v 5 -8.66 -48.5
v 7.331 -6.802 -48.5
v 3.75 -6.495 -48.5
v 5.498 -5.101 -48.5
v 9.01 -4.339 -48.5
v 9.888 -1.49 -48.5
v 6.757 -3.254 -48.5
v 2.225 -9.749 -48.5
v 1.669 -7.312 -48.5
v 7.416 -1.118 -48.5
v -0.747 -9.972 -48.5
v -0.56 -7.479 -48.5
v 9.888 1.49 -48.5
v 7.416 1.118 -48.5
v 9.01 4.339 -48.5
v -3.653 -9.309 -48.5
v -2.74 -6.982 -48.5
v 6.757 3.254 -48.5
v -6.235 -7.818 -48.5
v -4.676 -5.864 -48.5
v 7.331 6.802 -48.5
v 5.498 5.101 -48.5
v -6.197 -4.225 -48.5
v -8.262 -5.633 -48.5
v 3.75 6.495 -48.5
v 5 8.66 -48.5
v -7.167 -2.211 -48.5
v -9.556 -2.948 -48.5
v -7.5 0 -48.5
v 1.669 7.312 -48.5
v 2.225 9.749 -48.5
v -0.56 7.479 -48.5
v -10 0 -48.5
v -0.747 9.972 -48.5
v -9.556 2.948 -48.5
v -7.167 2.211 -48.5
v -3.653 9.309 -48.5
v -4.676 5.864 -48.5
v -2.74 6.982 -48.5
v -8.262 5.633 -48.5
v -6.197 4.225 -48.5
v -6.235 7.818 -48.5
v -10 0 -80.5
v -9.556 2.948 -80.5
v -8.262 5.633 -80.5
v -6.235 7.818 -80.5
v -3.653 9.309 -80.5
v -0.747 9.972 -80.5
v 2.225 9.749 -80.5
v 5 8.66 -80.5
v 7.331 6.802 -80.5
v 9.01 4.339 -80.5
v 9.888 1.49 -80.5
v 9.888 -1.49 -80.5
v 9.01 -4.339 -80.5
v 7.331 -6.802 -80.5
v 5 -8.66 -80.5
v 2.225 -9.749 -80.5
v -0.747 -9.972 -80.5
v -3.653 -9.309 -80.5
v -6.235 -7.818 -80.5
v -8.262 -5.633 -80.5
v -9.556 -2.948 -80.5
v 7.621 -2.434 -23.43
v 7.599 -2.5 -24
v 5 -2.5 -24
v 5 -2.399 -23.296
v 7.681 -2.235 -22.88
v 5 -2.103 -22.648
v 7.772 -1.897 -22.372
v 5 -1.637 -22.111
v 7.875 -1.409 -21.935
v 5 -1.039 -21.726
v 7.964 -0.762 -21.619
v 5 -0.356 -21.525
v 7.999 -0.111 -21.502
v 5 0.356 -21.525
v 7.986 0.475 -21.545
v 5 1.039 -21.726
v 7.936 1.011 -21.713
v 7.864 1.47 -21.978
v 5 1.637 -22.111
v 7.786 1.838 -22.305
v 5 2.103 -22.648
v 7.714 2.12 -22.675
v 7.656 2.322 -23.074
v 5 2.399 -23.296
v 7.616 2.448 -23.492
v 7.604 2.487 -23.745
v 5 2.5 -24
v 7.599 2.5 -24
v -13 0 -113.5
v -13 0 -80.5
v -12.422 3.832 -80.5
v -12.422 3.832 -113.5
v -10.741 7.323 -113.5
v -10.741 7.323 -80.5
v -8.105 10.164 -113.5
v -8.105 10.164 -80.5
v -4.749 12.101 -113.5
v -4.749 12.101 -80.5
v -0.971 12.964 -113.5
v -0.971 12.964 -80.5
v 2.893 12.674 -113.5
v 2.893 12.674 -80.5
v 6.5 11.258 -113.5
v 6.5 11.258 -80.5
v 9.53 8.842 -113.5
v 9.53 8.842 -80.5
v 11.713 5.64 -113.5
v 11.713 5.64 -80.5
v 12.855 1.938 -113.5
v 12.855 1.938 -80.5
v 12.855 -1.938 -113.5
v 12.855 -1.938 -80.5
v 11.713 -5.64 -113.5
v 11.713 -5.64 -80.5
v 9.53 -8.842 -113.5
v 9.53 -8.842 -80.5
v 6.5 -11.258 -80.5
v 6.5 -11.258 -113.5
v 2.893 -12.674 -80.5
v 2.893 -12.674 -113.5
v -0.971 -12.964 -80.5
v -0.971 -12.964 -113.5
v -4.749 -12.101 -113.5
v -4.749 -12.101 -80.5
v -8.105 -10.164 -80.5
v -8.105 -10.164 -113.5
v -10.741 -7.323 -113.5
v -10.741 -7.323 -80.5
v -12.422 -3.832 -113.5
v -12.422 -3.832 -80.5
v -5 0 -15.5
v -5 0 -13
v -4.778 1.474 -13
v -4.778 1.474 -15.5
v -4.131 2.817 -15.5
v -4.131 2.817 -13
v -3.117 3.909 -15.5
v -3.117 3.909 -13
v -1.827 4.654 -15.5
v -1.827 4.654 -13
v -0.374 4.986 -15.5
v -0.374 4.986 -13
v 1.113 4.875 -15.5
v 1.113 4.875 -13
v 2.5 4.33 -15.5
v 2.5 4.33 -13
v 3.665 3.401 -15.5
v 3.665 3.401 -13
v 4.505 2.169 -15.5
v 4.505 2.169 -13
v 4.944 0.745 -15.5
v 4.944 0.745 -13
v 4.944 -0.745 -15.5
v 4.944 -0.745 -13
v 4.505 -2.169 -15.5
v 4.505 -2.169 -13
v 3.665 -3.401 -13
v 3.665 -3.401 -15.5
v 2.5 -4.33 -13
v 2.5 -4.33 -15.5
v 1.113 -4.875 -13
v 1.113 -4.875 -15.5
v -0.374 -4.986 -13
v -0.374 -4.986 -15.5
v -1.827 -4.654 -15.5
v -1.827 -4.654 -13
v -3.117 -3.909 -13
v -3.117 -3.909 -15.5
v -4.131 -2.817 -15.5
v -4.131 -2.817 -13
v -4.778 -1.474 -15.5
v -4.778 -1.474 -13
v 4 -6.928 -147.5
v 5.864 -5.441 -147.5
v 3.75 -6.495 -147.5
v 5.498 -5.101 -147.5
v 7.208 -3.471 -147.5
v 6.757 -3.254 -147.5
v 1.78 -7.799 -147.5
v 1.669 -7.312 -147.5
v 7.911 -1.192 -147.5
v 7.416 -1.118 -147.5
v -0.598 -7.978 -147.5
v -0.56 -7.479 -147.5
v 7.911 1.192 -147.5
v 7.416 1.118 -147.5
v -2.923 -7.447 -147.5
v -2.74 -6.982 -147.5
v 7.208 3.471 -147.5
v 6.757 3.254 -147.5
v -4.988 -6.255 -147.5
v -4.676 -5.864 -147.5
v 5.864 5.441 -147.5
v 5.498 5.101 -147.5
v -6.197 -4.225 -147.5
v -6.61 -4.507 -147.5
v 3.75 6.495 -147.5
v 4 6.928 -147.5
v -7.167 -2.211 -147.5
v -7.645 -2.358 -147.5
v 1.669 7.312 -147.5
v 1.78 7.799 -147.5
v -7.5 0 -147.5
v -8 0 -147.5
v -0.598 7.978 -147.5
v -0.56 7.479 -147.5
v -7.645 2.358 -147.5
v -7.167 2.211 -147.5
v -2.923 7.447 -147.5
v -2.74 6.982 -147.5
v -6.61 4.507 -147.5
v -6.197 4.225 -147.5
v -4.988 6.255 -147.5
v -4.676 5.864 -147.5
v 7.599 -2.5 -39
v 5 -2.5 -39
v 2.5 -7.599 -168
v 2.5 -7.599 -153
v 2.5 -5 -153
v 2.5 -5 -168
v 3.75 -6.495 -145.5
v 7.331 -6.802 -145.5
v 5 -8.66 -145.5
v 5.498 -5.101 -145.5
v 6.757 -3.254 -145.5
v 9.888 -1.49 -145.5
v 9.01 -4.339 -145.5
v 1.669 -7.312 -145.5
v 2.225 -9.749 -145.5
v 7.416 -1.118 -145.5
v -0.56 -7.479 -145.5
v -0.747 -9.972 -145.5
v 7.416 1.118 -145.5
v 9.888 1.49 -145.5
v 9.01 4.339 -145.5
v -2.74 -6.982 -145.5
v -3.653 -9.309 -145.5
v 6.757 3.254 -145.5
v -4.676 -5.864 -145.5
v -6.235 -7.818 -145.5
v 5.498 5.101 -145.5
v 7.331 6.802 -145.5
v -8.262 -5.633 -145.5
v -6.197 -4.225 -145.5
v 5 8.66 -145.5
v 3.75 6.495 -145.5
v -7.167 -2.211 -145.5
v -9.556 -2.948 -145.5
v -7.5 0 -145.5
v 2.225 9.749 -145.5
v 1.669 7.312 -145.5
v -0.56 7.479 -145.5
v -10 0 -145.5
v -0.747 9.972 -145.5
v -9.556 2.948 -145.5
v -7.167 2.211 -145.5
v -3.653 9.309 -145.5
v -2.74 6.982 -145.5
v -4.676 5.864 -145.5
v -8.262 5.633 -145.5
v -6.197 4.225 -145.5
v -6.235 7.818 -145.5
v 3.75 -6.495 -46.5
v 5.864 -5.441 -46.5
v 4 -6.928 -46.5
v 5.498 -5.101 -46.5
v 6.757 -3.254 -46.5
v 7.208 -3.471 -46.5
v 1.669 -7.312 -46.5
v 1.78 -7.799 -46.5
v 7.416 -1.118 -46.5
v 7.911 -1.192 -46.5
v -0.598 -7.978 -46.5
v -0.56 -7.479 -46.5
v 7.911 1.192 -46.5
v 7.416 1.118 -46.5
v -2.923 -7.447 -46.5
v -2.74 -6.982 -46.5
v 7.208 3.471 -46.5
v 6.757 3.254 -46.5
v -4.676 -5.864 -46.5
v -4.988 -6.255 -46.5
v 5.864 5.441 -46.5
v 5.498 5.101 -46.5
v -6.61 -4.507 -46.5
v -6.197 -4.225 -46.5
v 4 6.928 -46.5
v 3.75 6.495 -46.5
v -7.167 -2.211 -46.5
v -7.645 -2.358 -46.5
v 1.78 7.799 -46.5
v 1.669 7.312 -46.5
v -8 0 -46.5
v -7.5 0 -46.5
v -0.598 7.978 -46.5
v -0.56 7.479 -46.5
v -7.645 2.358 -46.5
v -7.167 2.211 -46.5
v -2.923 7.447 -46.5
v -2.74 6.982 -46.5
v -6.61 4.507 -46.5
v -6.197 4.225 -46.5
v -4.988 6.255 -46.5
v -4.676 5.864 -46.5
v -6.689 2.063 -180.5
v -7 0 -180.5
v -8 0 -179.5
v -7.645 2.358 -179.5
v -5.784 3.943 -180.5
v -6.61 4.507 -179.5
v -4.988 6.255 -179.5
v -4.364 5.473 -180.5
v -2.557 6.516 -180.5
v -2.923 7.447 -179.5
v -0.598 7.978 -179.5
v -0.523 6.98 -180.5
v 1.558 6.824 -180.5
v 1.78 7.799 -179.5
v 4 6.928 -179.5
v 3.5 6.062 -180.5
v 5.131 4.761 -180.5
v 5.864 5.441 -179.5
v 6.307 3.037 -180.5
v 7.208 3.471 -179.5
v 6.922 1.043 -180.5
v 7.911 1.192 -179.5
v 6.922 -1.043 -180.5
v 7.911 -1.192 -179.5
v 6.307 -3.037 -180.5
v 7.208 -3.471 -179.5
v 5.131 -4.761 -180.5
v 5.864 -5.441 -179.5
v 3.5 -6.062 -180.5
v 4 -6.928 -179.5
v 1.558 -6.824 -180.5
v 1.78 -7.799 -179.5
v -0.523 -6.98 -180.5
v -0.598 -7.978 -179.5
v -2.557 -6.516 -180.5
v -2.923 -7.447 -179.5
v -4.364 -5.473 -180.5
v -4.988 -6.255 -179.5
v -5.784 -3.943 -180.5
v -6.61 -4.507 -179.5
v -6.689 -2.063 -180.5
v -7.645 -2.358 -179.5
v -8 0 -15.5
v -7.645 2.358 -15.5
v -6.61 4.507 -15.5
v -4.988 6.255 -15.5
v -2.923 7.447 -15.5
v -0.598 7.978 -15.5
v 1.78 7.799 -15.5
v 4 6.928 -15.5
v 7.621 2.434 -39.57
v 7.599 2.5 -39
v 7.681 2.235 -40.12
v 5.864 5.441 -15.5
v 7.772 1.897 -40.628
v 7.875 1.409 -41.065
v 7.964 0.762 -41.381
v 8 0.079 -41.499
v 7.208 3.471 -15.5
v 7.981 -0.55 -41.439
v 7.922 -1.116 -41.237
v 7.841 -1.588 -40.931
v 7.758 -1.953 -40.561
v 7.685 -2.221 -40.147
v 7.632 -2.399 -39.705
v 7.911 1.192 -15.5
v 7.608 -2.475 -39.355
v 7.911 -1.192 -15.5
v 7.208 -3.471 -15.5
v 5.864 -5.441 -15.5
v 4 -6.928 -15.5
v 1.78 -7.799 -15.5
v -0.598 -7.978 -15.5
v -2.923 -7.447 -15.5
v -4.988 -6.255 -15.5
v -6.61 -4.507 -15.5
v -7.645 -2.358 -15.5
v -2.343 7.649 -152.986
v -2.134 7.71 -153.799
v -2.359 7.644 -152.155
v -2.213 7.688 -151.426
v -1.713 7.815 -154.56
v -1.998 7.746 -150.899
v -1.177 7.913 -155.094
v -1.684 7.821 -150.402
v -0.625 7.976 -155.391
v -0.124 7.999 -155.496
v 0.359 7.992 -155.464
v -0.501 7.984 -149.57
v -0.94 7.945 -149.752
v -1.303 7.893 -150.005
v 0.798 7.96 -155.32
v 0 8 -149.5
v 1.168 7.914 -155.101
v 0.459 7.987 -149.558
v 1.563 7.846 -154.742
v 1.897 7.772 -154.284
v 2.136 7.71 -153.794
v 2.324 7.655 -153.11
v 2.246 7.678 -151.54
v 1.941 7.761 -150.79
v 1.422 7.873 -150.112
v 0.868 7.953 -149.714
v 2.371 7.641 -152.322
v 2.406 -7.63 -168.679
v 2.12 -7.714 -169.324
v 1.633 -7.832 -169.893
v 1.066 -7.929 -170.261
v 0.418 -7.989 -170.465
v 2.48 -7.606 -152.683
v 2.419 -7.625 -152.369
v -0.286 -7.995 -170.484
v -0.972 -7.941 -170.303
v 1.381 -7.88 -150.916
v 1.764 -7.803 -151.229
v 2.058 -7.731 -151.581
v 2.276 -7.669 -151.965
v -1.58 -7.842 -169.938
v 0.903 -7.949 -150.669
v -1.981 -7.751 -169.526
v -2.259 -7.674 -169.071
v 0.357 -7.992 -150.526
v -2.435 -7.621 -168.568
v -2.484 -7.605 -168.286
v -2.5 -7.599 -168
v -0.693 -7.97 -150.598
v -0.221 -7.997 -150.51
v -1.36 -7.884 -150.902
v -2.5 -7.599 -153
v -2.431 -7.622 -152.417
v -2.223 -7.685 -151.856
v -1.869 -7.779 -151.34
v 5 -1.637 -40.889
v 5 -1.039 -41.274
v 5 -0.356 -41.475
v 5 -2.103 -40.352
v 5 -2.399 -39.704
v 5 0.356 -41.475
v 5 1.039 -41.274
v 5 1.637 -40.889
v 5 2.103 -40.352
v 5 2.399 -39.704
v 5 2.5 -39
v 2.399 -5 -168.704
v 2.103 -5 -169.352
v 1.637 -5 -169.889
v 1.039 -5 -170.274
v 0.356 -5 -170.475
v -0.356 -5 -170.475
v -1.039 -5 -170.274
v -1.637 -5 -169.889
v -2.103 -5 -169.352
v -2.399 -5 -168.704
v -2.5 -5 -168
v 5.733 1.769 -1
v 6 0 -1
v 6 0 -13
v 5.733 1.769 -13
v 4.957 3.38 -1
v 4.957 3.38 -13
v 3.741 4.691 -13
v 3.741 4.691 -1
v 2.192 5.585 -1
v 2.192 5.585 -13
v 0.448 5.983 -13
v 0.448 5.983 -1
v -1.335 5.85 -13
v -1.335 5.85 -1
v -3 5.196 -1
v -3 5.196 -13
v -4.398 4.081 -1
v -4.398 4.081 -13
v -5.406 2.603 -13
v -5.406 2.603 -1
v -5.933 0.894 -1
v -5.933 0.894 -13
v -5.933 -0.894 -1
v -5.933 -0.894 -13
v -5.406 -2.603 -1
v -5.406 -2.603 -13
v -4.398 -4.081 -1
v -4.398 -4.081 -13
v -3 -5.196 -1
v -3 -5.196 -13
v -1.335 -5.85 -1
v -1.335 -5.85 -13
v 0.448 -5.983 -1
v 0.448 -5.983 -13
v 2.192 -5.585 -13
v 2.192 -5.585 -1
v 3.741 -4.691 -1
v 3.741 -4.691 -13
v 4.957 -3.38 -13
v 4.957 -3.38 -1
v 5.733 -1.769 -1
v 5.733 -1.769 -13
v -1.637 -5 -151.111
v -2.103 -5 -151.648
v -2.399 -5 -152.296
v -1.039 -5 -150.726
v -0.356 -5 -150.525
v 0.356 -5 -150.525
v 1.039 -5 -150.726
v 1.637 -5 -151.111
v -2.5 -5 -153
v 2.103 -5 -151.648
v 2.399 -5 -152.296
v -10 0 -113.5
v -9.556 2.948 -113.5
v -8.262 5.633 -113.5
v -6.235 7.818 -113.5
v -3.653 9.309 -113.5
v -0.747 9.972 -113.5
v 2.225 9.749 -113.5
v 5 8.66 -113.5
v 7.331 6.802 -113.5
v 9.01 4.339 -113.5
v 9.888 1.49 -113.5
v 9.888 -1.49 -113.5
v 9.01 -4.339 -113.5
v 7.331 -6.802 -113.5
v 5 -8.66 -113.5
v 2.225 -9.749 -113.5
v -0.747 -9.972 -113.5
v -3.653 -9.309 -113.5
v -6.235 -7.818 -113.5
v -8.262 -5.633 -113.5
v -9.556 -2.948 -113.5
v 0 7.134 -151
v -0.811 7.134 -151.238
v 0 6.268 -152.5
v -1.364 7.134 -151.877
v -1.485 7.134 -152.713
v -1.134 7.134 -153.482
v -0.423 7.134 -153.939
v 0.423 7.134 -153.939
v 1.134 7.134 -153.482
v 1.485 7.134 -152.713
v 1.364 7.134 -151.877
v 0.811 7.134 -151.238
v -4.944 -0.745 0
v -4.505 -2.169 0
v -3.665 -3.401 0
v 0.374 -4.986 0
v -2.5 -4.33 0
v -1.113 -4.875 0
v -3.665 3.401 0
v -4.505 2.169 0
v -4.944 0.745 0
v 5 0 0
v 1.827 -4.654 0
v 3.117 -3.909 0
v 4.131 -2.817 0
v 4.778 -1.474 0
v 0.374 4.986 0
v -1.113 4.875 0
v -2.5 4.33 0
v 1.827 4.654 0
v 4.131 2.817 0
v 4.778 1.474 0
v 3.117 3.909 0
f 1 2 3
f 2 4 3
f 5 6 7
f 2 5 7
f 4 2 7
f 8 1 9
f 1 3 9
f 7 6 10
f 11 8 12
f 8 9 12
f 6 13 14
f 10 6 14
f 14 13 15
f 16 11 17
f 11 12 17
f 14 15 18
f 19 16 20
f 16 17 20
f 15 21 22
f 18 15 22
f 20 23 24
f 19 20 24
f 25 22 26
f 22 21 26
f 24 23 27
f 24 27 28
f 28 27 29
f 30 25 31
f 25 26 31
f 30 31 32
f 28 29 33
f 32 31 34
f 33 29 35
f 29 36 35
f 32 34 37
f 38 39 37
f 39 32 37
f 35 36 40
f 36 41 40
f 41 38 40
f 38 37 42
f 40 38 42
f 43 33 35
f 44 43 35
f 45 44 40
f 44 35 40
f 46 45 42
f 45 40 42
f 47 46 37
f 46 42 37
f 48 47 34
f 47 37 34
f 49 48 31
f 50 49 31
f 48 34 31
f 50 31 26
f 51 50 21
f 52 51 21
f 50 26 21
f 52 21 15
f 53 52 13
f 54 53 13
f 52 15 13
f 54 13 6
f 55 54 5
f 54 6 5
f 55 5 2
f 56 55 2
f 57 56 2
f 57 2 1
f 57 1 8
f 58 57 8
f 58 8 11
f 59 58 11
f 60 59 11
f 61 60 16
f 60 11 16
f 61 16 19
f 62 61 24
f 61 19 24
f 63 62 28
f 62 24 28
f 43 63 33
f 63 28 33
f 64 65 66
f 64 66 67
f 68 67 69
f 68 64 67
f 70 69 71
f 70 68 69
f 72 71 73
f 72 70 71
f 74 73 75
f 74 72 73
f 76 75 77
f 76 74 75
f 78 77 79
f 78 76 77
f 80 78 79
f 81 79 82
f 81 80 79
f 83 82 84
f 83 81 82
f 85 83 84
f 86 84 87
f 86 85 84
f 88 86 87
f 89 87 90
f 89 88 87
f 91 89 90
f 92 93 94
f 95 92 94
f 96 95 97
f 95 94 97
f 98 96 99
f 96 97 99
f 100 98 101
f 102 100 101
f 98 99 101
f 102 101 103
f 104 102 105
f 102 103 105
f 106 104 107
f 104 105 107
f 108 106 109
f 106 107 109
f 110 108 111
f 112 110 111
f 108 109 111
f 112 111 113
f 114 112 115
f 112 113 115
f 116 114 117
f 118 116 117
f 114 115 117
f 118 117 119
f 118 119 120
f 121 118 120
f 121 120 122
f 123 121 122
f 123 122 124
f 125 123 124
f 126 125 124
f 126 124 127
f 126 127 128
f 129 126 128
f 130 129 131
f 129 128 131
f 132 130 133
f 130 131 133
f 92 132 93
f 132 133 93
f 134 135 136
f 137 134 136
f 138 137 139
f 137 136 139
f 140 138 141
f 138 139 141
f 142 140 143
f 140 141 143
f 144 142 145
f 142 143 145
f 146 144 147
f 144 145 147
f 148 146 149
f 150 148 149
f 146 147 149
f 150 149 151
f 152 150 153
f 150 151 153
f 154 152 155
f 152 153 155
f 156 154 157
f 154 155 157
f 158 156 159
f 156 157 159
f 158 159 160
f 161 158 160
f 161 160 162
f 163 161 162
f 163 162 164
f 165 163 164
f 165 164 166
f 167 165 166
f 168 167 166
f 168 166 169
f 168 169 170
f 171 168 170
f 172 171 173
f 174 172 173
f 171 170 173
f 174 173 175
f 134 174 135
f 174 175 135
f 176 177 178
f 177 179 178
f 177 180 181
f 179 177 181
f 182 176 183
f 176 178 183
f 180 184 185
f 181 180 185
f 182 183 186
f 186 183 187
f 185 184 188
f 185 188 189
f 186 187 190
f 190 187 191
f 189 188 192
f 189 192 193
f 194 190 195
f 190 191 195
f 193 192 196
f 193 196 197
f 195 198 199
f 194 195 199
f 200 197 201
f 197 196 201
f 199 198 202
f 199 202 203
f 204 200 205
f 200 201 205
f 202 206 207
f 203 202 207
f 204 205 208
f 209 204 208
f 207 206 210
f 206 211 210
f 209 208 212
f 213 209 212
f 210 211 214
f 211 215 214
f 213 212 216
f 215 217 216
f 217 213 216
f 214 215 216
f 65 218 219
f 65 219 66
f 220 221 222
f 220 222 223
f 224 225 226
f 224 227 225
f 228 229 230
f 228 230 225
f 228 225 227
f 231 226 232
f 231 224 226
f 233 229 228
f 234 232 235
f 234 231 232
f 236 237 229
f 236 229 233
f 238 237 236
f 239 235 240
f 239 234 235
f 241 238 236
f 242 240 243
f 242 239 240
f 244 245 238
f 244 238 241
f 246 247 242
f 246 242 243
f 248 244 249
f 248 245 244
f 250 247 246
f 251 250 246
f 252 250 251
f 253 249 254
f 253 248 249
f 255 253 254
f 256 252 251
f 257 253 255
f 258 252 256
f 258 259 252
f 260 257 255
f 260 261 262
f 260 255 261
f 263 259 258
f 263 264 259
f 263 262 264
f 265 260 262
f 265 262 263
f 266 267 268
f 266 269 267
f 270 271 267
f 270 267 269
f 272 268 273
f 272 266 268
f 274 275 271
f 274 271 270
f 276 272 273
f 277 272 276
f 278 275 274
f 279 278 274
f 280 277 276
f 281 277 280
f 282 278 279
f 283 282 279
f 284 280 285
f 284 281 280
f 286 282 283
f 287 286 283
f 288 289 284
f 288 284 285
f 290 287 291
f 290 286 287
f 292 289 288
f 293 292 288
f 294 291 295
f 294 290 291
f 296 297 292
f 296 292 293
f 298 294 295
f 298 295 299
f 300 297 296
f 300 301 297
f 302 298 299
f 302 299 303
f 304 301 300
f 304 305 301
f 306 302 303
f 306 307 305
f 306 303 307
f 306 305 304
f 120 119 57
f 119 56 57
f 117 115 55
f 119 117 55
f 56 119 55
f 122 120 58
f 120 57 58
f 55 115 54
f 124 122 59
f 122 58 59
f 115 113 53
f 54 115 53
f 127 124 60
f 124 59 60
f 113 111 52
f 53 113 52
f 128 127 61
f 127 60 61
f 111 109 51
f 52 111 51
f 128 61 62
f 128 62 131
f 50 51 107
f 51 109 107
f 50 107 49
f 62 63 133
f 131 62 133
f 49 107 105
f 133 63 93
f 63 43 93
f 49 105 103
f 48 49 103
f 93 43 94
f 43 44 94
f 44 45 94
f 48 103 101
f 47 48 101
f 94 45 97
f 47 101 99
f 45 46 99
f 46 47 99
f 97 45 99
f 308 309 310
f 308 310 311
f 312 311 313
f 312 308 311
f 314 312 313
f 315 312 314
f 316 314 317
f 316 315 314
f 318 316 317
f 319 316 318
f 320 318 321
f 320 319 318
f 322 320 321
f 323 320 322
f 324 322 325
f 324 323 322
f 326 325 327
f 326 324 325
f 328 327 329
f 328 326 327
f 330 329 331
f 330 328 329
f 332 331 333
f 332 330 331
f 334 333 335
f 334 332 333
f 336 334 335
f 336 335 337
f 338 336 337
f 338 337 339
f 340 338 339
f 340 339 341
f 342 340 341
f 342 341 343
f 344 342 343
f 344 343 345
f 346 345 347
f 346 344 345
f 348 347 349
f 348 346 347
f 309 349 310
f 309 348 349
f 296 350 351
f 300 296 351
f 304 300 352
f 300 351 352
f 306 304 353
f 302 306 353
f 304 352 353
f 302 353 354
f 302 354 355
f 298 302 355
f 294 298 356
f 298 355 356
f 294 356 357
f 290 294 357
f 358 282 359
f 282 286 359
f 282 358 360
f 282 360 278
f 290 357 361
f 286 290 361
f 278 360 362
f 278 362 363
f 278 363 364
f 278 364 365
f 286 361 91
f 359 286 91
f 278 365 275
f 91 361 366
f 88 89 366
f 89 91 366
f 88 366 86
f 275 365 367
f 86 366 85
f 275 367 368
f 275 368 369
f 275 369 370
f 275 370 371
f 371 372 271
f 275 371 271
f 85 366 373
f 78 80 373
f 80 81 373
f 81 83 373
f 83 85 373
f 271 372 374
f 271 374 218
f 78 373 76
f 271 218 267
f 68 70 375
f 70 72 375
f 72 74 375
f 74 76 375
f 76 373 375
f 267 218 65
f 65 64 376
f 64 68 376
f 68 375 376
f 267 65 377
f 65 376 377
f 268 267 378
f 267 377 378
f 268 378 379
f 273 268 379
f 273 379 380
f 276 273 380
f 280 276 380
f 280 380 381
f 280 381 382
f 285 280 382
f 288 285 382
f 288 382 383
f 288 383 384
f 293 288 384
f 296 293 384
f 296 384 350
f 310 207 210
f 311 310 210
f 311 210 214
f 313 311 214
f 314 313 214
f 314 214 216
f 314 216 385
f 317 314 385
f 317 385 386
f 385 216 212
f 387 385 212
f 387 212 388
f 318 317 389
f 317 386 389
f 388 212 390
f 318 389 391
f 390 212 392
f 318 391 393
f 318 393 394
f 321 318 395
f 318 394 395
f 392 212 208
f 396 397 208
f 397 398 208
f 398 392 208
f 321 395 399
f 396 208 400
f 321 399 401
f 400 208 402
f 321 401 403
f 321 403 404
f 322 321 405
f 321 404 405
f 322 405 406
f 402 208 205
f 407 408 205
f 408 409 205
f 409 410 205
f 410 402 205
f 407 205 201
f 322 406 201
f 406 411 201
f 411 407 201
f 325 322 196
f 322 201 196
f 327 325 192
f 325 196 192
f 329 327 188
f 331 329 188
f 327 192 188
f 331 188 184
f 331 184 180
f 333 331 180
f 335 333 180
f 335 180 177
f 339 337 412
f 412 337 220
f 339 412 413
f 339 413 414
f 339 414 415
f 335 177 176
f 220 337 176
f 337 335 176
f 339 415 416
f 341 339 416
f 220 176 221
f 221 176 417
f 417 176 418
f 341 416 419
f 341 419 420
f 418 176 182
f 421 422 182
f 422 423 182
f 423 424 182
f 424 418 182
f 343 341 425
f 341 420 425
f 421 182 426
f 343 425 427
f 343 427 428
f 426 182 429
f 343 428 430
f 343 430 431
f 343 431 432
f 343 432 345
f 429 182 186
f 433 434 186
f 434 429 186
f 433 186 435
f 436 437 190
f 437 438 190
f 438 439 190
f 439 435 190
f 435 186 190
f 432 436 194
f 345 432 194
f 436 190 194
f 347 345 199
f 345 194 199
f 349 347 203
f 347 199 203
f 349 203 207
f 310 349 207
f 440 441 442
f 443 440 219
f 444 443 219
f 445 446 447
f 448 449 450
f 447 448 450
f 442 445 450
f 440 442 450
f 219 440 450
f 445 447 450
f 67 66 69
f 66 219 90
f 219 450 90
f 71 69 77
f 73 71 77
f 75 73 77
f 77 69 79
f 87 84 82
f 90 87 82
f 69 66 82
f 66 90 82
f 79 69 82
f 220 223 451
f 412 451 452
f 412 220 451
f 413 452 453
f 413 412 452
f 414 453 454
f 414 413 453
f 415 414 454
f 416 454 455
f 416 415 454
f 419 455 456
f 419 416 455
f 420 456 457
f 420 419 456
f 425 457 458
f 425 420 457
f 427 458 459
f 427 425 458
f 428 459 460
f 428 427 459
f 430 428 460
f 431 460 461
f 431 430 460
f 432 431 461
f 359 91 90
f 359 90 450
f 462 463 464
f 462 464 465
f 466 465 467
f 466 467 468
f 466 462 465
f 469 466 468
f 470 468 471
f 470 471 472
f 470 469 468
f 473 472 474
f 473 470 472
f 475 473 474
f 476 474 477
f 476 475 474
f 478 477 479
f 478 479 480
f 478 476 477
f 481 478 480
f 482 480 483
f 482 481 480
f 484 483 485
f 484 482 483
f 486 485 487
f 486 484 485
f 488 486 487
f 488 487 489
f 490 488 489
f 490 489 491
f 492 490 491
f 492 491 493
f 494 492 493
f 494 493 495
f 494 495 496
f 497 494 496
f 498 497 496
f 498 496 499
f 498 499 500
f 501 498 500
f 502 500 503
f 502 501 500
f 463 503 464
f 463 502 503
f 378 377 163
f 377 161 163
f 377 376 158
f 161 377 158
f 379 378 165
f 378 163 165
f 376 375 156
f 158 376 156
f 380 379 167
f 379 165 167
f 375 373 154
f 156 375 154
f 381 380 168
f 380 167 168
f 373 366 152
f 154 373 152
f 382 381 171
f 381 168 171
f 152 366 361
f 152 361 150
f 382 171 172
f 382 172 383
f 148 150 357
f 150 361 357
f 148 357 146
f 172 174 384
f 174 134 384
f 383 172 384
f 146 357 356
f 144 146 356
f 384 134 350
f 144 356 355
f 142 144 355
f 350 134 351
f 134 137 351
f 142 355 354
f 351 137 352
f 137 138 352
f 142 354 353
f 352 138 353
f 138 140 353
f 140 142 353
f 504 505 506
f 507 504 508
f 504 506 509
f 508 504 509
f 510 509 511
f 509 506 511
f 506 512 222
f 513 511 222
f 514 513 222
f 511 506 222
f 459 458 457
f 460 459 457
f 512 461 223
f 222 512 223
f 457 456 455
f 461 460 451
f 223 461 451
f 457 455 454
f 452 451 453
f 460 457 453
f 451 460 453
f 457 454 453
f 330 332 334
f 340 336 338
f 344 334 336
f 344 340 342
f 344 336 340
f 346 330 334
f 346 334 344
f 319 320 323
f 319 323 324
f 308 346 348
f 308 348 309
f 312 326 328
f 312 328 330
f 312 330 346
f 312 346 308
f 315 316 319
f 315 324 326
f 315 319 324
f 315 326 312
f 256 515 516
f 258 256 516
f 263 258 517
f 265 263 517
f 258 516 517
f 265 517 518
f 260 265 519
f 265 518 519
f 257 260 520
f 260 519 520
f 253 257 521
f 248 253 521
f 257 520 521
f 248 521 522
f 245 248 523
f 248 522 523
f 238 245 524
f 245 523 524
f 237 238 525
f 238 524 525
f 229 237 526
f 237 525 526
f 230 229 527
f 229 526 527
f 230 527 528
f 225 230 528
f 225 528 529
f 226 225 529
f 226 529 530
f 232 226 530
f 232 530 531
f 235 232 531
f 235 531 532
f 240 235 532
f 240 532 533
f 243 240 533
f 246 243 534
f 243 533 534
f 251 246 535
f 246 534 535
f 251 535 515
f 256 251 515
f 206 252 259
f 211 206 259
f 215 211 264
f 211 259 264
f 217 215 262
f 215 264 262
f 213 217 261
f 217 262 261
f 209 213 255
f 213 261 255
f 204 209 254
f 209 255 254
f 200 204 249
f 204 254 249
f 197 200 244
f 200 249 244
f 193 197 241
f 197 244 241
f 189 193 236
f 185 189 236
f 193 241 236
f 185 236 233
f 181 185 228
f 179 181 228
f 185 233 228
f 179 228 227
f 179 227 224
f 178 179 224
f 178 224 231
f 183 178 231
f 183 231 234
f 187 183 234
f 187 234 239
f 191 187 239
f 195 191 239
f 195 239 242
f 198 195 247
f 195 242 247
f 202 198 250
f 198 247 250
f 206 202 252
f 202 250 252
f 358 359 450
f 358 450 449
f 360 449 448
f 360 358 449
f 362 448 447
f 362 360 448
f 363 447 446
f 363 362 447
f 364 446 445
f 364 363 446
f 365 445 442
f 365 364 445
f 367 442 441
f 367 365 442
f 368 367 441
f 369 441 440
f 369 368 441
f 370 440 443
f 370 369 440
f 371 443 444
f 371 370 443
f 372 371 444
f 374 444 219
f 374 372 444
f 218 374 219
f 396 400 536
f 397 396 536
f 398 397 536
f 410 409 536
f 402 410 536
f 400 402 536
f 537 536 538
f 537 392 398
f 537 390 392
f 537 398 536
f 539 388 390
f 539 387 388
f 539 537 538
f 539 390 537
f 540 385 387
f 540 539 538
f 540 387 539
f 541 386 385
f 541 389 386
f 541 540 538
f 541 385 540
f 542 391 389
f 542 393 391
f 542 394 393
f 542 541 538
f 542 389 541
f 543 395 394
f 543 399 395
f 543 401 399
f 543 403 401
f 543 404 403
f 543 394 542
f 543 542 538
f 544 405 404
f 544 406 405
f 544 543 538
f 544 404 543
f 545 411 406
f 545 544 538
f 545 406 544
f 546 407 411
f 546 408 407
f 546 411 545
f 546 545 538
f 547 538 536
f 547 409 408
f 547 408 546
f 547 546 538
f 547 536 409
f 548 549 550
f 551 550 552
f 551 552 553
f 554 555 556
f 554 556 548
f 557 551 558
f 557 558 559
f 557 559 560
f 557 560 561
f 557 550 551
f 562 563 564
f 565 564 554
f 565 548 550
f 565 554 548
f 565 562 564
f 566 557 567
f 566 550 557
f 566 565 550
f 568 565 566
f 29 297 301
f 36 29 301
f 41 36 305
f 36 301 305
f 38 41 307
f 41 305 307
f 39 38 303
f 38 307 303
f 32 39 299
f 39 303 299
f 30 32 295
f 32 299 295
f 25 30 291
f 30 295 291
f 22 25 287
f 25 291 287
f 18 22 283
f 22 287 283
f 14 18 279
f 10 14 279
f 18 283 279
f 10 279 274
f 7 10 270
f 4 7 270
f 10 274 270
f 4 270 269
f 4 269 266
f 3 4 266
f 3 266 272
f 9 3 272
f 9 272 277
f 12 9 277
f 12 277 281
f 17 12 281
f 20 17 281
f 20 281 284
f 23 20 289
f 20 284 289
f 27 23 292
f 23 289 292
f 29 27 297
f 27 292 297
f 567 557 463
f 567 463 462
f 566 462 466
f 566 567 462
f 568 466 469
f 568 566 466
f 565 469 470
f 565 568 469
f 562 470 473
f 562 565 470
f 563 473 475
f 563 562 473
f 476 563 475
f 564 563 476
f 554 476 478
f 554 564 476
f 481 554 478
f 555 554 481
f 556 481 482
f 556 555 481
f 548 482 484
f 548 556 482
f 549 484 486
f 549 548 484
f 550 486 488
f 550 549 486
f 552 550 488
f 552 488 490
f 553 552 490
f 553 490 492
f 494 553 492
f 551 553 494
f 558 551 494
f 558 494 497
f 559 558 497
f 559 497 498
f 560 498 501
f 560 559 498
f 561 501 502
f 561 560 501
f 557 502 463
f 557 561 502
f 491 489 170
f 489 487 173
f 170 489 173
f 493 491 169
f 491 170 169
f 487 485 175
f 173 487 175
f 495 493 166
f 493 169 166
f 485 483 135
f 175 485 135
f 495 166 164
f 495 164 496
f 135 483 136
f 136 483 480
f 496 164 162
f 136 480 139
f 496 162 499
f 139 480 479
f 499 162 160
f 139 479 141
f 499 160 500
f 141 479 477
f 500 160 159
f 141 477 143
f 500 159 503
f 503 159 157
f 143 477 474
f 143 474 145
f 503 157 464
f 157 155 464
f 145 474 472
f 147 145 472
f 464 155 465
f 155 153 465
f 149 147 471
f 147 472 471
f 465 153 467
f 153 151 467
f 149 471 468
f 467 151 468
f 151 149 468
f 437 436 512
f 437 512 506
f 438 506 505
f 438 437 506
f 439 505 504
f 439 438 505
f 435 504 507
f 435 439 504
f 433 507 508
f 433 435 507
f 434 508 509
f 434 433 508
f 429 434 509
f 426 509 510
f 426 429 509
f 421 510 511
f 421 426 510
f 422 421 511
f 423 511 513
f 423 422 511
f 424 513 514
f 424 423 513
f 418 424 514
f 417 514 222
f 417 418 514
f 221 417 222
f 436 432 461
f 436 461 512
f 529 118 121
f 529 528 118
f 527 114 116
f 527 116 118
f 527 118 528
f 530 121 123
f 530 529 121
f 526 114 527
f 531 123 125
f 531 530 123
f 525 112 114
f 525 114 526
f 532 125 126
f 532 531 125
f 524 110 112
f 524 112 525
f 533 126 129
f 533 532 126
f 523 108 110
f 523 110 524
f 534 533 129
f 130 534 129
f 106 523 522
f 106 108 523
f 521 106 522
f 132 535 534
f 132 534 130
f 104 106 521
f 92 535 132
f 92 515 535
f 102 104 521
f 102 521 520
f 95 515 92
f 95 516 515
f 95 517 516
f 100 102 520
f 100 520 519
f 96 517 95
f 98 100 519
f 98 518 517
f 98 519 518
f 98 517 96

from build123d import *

# Parameters (mm, degrees)
SKETCH_1_R          = 6
EXTRUDE_1_DEPTH     = 13
SKETCH_2_R          = 5
EXTRUDE_2_DEPTH     = 2.5
SKETCH_3_R          = 8
EXTRUDE_3_DEPTH     = 31
SKETCH_4_R          = 7.5
EXTRUDE_4_DEPTH     = 2
SKETCH_5_R          = 10
EXTRUDE_5_DEPTH     = 32
SKETCH_6_R          = 13
EXTRUDE_6_DEPTH     = 33
SKETCH_7_R          = 10
EXTRUDE_7_DEPTH     = 32
SKETCH_8_R          = 7.5
EXTRUDE_8_DEPTH     = 2
SKETCH_9_R          = 8
EXTRUDE_9_DEPTH     = 33
CUT_EXTRUDE_1_DEPTH = 3
CUT_EXTRUDE_2_DEPTH = 3
CHAMFER_1_SIZE      = 1


with BuildPart() as part:
    # 草图1 → 凸台-拉伸1 (new body)
    with BuildSketch(Plane.XY):
        Circle(SKETCH_1_R)
    extrude(amount=-EXTRUDE_1_DEPTH)

    # 草图2 → 凸台-拉伸2 (add)
    with BuildSketch(Plane(origin=(0, 0, -13), x_dir=(-1, 0, 0), z_dir=(0, 0, -1))):
        Circle(SKETCH_2_R)
    extrude(amount=EXTRUDE_2_DEPTH)

    # 草图3 → 凸台-拉伸3 (add)
    with BuildSketch(Plane(origin=(0, 0, -15.5), x_dir=(-1, 0, 0), z_dir=(0, 0, -1))):
        Circle(SKETCH_3_R)
    extrude(amount=EXTRUDE_3_DEPTH)

    # 草图4 → 凸台-拉伸4 (add)
    with BuildSketch(Plane(origin=(0, 0, -46.5), x_dir=(-1, 0, 0), z_dir=(0, 0, -1))):
        Circle(SKETCH_4_R)
    extrude(amount=EXTRUDE_4_DEPTH)

    # 草图5 → 凸台-拉伸5 (add)
    with BuildSketch(Plane(origin=(0, 0, -48.5), x_dir=(-1, 0, 0), z_dir=(0, 0, -1))):
        Circle(SKETCH_5_R)
    extrude(amount=EXTRUDE_5_DEPTH)

    # 草图6 → 凸台-拉伸6 (add)
    with BuildSketch(Plane(origin=(0, 0, -80.5), x_dir=(-1, 0, 0), z_dir=(0, 0, -1))):
        Circle(SKETCH_6_R)
    extrude(amount=EXTRUDE_6_DEPTH)

    # 草图7 → 凸台-拉伸7 (add)
    with BuildSketch(Plane(origin=(0, 0, -113.5), x_dir=(-1, 0, 0), z_dir=(0, 0, -1))):
        Circle(SKETCH_7_R)
    extrude(amount=EXTRUDE_7_DEPTH)

    # 草图8 → 凸台-拉伸8 (add)
    with BuildSketch(Plane(origin=(0, 0, -145.5), x_dir=(-1, 0, 0), z_dir=(0, 0, -1))):
        Circle(SKETCH_8_R)
    extrude(amount=EXTRUDE_8_DEPTH)

    # 草图9 → 凸台-拉伸9 (add)
    with BuildSketch(Plane(origin=(0, 0, -147.5), x_dir=(-1, 0, 0), z_dir=(0, 0, -1))):
        Circle(SKETCH_9_R)
    extrude(amount=EXTRUDE_9_DEPTH)

    # 草图11 → 切除-拉伸1 (cut)
    with BuildSketch(Plane(origin=(8, 0, 0), x_dir=(0, 0, -1), z_dir=(1, 0, 0))):
        with BuildLine():
            Line((24, 2.5), (39, 2.5))
            ThreePointArc((39, 2.5), (41.5, 0), (39, -2.5))
            Line((39, -2.5), (24, -2.5))
            ThreePointArc((24, -2.5), (21.5, 0), (24, 2.5))
        make_face()
    extrude(amount=-CUT_EXTRUDE_1_DEPTH, mode=Mode.SUBTRACT)

    # 草图12 → 切除-拉伸2 (cut)
    with BuildSketch(Plane(origin=(0, -8, 0), x_dir=(1, 0, 0), z_dir=(0, 1, 0))):
        with BuildLine():
            Line((-2.5, 168), (-2.5, 153))
            ThreePointArc((-2.5, 153), (0, 150.5), (2.5, 153))
            Line((2.5, 153), (2.5, 168))
            ThreePointArc((2.5, 168), (0, 170.5), (-2.5, 168))
        make_face()
    extrude(amount=CUT_EXTRUDE_2_DEPTH, mode=Mode.SUBTRACT)

    # 草图18 → 切除-旋转1 (revolve, cut)
    with BuildSketch(Plane(origin=(0, 0, 0), x_dir=(0, 0, -1), z_dir=(1, 0, 0))):
        Polygon((149.5, 8), (152.5, 8), (152.5, 6.267949192), align=None)
    revolve(axis=Axis((0, 8, -152.5), (0, -1, 0)), mode=Mode.SUBTRACT)

    # 倒角1
    chamfer_1_edges = [part.edges().sort_by_distance(p)[0] for p in [
        (-6, 0, 0),
        (8, 0, -180.5),
    ]]
    chamfer(chamfer_1_edges, length=CHAMFER_1_SIZE)


solid = part.part
